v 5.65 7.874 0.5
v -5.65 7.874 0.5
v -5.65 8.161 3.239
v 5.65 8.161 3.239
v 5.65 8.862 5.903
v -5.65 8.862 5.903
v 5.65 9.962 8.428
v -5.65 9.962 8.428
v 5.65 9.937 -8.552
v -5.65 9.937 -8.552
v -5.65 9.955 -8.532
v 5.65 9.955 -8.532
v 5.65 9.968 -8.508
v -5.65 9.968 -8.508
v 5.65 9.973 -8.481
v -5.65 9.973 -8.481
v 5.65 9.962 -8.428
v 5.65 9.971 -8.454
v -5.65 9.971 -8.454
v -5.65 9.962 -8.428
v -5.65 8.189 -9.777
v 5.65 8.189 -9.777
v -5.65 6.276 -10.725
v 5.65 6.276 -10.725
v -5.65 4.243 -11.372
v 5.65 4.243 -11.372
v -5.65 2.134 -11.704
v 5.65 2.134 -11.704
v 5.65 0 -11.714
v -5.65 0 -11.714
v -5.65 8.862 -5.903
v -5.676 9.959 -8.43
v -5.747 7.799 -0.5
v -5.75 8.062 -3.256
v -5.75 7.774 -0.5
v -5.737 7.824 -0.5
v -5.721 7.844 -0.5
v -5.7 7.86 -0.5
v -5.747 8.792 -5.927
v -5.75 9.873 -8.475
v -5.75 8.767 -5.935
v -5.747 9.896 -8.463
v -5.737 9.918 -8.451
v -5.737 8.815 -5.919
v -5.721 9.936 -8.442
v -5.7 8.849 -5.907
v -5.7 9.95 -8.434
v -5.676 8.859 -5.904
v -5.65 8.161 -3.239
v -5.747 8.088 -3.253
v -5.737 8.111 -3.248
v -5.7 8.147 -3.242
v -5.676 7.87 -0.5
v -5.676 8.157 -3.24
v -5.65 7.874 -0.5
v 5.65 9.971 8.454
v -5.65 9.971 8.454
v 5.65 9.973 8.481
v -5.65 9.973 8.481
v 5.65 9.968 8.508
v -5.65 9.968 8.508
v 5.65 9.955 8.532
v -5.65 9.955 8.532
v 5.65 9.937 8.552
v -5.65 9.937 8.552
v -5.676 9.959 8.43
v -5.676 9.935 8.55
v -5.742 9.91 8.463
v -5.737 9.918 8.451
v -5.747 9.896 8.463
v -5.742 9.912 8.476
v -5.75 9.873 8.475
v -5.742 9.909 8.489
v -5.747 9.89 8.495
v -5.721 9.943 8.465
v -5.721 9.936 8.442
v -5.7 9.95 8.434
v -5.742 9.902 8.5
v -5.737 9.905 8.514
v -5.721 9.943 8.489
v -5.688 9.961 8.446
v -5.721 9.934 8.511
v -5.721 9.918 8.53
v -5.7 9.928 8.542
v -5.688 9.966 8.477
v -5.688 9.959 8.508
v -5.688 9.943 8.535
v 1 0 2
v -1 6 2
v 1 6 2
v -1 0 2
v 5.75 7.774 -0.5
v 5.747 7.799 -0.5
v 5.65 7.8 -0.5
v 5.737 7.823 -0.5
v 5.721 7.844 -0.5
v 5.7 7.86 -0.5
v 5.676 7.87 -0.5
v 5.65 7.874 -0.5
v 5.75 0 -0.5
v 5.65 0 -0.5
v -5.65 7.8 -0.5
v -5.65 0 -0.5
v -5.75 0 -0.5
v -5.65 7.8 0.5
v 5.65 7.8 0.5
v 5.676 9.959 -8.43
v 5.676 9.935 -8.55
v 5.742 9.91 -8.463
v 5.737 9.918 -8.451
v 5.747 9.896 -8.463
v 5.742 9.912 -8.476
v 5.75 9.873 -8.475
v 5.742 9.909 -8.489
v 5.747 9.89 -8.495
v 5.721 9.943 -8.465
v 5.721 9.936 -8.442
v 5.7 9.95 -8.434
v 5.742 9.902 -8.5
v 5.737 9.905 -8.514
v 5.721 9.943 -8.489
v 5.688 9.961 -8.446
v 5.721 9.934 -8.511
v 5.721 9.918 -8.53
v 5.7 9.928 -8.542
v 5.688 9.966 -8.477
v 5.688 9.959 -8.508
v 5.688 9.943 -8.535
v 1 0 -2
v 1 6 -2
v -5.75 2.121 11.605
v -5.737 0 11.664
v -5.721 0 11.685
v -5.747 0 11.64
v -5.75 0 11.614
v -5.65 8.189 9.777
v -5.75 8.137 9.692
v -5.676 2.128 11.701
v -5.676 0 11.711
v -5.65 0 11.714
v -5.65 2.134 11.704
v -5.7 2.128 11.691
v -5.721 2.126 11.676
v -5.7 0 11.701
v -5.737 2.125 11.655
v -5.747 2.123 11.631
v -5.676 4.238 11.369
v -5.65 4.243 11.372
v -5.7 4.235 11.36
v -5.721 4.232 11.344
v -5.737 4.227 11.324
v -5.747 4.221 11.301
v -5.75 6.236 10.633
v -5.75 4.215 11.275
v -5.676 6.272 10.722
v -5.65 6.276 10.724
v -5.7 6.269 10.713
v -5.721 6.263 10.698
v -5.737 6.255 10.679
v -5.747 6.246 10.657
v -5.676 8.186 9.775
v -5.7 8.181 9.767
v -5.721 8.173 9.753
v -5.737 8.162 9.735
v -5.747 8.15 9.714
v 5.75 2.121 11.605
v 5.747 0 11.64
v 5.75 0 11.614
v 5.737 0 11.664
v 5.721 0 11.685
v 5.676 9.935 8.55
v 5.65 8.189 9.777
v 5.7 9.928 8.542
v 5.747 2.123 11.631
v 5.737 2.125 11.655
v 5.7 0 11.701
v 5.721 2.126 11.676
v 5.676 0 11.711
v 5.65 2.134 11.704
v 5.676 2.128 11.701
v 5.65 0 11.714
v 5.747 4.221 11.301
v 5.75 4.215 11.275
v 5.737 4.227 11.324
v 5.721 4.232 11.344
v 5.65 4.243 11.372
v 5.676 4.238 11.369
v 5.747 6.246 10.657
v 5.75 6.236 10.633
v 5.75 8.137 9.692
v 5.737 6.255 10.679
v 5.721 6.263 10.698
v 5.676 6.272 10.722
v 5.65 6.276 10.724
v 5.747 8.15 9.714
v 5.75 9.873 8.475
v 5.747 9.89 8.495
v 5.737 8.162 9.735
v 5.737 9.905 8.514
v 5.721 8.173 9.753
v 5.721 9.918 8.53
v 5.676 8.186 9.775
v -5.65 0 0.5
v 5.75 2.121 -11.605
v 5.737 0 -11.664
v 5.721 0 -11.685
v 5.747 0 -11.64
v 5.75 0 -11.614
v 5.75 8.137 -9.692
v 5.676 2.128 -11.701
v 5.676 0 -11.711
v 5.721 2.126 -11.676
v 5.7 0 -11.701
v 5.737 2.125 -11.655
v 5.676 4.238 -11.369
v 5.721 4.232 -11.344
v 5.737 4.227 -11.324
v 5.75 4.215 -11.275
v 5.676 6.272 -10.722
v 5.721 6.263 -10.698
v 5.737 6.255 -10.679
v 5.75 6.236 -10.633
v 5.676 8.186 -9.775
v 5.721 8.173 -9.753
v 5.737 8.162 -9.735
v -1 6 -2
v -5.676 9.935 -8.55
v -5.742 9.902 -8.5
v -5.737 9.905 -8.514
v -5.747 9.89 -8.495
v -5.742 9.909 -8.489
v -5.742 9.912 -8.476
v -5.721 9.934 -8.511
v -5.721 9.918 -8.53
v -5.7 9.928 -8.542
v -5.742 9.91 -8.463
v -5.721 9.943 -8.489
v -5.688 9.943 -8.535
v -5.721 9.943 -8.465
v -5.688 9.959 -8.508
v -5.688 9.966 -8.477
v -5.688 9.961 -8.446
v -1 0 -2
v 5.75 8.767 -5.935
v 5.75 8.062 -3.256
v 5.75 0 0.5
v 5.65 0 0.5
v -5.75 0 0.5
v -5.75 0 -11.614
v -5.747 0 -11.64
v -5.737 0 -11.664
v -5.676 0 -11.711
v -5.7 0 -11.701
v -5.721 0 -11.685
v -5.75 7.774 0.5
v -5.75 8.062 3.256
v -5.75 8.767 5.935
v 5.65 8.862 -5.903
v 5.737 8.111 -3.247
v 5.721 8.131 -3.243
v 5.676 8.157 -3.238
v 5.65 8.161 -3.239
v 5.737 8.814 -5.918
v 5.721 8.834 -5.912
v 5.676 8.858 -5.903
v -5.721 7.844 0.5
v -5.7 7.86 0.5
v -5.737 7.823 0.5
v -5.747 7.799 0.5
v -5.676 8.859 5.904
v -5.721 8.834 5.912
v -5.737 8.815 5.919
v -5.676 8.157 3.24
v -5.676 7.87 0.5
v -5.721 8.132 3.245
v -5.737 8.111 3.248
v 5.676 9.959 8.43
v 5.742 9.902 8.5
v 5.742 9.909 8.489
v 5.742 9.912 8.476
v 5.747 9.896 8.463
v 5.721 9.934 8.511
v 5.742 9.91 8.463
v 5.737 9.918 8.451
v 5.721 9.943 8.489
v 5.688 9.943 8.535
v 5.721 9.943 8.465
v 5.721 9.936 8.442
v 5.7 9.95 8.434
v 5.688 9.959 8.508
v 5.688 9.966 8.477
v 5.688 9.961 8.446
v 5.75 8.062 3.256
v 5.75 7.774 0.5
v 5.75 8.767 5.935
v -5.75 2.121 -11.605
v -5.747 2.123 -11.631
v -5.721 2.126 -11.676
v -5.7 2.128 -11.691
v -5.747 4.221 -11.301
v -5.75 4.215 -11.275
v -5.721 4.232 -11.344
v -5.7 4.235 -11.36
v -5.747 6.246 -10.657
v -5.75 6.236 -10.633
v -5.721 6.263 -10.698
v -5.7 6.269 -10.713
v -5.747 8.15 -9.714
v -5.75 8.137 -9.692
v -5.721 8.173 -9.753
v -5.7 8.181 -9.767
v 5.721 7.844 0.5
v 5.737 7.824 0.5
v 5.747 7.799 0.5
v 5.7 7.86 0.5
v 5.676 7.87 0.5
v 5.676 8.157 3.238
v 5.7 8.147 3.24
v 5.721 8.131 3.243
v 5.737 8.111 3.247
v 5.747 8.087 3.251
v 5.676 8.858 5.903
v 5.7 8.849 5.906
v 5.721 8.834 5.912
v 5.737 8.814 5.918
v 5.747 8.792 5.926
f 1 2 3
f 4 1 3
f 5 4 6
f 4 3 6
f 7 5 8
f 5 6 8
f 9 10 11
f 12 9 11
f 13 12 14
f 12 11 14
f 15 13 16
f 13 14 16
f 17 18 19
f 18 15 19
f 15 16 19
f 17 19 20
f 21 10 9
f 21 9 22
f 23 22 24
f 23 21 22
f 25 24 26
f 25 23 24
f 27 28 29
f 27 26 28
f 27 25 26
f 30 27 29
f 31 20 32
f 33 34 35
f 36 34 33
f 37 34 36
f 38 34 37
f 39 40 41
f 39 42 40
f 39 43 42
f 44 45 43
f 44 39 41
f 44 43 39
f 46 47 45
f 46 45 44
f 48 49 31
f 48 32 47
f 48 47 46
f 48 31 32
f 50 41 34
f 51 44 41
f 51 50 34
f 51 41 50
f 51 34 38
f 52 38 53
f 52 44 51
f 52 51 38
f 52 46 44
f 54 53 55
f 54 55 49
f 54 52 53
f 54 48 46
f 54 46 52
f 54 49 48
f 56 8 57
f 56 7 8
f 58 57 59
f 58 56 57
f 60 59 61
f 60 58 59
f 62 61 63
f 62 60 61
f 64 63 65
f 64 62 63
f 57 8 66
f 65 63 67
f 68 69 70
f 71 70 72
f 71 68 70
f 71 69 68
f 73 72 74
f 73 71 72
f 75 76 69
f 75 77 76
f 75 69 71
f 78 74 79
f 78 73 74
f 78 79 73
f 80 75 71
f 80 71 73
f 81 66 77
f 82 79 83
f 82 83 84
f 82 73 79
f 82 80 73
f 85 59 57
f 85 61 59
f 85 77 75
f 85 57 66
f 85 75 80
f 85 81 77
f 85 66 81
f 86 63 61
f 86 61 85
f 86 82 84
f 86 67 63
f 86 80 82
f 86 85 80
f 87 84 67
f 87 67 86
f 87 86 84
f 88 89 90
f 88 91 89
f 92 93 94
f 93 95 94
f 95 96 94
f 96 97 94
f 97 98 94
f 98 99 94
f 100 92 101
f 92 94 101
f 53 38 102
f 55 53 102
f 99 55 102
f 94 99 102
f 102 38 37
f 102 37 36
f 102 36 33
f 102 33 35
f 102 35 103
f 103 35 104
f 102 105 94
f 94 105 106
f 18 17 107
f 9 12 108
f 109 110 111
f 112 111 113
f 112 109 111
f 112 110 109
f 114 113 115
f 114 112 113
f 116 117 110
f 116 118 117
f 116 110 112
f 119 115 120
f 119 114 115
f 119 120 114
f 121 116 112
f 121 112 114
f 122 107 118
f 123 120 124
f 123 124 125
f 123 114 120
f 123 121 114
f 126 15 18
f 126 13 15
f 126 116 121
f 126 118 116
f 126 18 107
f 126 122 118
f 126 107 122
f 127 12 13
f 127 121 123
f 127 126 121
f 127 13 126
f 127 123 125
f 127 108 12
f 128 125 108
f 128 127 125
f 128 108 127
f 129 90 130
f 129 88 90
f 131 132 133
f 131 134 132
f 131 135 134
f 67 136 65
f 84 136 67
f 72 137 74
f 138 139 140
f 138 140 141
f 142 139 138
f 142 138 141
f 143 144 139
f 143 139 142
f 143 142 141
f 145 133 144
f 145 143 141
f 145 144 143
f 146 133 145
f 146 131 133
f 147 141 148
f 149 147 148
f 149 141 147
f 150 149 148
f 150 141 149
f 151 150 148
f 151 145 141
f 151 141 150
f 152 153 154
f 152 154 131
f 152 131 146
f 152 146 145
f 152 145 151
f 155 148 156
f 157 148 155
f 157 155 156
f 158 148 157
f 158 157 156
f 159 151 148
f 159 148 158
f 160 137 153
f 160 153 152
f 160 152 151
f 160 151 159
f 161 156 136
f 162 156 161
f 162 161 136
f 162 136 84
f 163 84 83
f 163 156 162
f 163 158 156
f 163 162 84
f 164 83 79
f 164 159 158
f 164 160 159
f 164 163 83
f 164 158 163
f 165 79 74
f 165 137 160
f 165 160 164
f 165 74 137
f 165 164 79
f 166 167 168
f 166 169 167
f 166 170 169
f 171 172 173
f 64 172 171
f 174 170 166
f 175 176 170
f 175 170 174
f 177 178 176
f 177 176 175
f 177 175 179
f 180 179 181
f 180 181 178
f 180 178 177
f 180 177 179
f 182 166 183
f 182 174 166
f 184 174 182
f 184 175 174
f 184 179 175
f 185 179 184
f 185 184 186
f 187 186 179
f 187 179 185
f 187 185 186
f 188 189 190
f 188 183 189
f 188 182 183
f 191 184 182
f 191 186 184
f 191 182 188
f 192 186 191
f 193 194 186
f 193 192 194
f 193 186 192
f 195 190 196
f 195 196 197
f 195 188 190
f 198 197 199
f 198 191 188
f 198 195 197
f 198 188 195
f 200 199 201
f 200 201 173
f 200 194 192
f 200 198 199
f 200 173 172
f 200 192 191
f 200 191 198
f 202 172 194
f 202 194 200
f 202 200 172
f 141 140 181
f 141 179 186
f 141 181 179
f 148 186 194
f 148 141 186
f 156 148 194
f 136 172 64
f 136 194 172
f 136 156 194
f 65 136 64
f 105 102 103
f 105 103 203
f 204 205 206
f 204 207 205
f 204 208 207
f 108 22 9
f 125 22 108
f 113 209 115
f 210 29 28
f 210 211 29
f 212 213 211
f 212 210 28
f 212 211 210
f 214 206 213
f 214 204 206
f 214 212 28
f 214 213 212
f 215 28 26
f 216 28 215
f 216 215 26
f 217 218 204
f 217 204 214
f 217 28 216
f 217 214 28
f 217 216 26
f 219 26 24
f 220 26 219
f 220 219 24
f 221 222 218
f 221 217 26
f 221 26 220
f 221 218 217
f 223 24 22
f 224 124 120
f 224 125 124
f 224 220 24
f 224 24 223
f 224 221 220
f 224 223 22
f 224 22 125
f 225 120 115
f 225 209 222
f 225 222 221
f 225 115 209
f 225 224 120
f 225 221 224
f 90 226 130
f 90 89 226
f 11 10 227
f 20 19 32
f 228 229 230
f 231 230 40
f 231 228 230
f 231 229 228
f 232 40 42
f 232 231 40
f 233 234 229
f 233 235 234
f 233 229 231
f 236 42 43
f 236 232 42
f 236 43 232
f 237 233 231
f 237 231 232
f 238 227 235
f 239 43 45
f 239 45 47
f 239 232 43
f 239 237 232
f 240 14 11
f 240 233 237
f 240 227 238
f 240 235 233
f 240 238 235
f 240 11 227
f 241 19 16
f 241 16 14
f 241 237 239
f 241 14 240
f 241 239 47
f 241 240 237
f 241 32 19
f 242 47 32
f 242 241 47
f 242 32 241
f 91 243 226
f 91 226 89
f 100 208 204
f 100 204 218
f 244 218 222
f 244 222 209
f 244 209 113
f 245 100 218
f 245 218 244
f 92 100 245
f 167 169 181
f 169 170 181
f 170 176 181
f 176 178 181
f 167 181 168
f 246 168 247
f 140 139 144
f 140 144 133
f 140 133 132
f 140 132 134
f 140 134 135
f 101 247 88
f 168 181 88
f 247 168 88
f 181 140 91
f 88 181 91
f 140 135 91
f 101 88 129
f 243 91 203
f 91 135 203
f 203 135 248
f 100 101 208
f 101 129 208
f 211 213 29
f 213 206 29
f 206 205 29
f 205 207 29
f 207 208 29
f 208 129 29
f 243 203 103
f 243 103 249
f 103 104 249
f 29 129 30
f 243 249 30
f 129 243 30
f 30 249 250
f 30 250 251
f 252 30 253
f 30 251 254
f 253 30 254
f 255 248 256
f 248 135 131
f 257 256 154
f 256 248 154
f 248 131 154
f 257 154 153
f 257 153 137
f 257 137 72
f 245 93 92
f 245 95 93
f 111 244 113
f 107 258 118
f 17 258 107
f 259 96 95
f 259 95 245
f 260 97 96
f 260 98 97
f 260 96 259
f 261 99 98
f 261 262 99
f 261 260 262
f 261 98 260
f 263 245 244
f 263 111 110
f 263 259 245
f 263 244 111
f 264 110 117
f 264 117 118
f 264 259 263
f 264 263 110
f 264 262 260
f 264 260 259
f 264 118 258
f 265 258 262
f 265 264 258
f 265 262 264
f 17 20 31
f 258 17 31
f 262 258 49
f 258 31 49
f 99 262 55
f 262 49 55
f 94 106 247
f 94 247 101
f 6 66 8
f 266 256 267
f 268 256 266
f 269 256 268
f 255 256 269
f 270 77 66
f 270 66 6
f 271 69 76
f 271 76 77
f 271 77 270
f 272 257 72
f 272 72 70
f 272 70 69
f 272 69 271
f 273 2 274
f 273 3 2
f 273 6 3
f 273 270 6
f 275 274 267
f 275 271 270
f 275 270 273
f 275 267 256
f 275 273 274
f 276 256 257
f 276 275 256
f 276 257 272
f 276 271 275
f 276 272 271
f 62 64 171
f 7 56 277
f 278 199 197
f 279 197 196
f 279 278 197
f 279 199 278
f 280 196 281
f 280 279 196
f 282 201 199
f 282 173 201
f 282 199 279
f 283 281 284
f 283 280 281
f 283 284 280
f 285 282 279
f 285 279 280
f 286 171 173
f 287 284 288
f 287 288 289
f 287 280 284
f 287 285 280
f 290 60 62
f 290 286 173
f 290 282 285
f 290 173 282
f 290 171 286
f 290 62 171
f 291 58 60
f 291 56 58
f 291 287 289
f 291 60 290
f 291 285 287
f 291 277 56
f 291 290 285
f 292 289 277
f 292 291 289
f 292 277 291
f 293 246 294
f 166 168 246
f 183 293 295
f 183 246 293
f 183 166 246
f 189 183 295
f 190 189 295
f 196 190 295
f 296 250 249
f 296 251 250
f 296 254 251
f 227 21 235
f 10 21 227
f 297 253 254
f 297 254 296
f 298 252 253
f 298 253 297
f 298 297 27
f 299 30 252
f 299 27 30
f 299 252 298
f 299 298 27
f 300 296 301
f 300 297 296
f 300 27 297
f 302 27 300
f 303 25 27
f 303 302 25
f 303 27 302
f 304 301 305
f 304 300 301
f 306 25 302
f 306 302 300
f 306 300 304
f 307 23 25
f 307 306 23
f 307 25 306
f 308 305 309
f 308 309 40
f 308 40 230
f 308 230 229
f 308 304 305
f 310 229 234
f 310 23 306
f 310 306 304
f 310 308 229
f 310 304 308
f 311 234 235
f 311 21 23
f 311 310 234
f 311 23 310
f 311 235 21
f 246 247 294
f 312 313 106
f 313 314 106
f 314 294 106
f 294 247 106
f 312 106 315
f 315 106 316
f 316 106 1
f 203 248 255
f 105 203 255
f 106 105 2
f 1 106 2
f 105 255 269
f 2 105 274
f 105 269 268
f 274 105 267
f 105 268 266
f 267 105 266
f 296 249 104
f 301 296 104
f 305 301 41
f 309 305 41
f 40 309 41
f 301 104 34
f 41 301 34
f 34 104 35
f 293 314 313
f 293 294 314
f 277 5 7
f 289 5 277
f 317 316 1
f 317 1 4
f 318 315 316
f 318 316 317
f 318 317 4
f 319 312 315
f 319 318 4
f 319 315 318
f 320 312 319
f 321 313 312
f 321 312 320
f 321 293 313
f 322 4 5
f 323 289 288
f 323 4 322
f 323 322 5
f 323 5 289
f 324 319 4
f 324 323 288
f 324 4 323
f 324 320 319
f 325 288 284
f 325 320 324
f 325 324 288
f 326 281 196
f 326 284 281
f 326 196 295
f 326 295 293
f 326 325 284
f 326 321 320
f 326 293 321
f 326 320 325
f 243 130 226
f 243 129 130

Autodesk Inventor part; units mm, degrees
ref_plane "YZ Plane" through (0, 0, 0) normal (1, 0, 0) x (0, 1, 0)
ref_plane "XZ Plane" through (0, 0, 0) normal (0, 1, 0) x (-1, 0, 0)
sketch "Sketch2" plane through (0, 0, 0) normal (1, 0, 0) x (0, 1, 0)
  point P0 (0, 0)
sketch "Sketch3" plane through (0, 0, 0) normal (1, 0, 0) x (0, 1, 0)
  arc A0 (10, 8.5) -> (10, -8.5) centre (25.8666, 0) ccw
  arc A1 (10, 8.5) -> (0, 11.7145) centre (1, -2.3365) ccw
  line L0 (0, 11.7145) -> (0, -11.7145)
  line L1 (0, 0) -> (7.8666, 0)
  line L2 (2.6813, 11.75) -> (0, 11.75) construction
  arc A2 (0, -11.7145) -> (10, -8.5) centre (1, 2.3365) ccw
  line L3 (2.6813, -11.75) -> (0, -11.75) construction
  dimension "d1" = 10
  dimension "d2" = 23.5
  dimension "d3" = 1
  dimension "d4" = 17
  dimension "d5" = 18
extrude "Extrusion1" add sketch "Sketch3" along normal mid plane 11.5
sketch "Sketch4" plane through (-5.75, 0, -11.7145) normal (0, -1, 0) x (1, 0, 0)
  line L0 (4.75, 13.7145) -> (6.75, 13.7145)
  line L1 (6.75, 13.7145) -> (6.75, 9.7145)
  line L2 (6.75, 9.7145) -> (4.75, 9.7145)
  line L3 (4.75, 9.7145) -> (4.75, 13.7145)
  line L4 (4.75, 13.7145) -> (6.75, 9.7145) construction
  line L5 (6.75, 13.7145) -> (4.75, 9.7145) construction
  point P0 (5.75, 11.7145)
  dimension "d8" = 2
  dimension "d9" = 4
extrude "Extrusion2" cut sketch "Sketch4" against normal blind 6
sketch "Sketch5" plane through (5.75, 0, 0) normal (1, 0, 0) x (0, 0, -1)
  line L0 (11.7145, 0) -> (-11.7145, 0) projected
  line L1 (-0.5, 0) -> (0.5, 0)
  line L2 (0.5, 0) -> (0.5, 9.525)
  line L3 (0.5, 9.525) -> (-0.5, 9.525)
  line L4 (-0.5, 9.525) -> (-0.5, 0)
  point P0 (0, 0)
  point P1 (0, 0)
  dimension "d12" = 1
extrude "Extrusion3" cut sketch "Sketch5" against normal blind 0.1
mirror "Mirror1" about plane through (0, 0, 0) normal (1, 0, 0) of "Extrusion3"
ref_plane "Work Plane1" through (5.75, 10, 8.5) normal (0, -1, 0) x (1, 0, 0)
sketch "Sketch6" plane through (5.75, 10, 8.5) normal (0, -1, 0) x (1, 0, 0)
  line L0 (-11.4, -8) -> (-11.4, -9) projected
  line L1 (-11.4, -8) -> (-0.1, -8)
  line L2 (-0.1, -8) -> (-0.1, -9)
  line L3 (-0.1, -9) -> (-11.4, -9)
  line L4 (-11.4, -9) -> (-11.4, -8)
  point P0 (-5.75, -8.5)
extrude "Extrusion4" cut sketch "Sketch6" along normal blind 2.2
fillet "Fillet1" radius 0.1 10 edges at (-5.75, 5.3108, -11.0742) (5.75, 5.3108, -11.0742) (0, 10, -8.5) (5.75, 8.4707, -4.6239) (-5.75, 8.4707, -4.6239) (-5.75, 8.4707, 4.6239) (5.75, 8.4707, 4.6239) (-5.75, 5.3108, 11.0742) (0, 10, 8.5) (5.75, 5.3108, 11.0742)
properties part number "Cup"
